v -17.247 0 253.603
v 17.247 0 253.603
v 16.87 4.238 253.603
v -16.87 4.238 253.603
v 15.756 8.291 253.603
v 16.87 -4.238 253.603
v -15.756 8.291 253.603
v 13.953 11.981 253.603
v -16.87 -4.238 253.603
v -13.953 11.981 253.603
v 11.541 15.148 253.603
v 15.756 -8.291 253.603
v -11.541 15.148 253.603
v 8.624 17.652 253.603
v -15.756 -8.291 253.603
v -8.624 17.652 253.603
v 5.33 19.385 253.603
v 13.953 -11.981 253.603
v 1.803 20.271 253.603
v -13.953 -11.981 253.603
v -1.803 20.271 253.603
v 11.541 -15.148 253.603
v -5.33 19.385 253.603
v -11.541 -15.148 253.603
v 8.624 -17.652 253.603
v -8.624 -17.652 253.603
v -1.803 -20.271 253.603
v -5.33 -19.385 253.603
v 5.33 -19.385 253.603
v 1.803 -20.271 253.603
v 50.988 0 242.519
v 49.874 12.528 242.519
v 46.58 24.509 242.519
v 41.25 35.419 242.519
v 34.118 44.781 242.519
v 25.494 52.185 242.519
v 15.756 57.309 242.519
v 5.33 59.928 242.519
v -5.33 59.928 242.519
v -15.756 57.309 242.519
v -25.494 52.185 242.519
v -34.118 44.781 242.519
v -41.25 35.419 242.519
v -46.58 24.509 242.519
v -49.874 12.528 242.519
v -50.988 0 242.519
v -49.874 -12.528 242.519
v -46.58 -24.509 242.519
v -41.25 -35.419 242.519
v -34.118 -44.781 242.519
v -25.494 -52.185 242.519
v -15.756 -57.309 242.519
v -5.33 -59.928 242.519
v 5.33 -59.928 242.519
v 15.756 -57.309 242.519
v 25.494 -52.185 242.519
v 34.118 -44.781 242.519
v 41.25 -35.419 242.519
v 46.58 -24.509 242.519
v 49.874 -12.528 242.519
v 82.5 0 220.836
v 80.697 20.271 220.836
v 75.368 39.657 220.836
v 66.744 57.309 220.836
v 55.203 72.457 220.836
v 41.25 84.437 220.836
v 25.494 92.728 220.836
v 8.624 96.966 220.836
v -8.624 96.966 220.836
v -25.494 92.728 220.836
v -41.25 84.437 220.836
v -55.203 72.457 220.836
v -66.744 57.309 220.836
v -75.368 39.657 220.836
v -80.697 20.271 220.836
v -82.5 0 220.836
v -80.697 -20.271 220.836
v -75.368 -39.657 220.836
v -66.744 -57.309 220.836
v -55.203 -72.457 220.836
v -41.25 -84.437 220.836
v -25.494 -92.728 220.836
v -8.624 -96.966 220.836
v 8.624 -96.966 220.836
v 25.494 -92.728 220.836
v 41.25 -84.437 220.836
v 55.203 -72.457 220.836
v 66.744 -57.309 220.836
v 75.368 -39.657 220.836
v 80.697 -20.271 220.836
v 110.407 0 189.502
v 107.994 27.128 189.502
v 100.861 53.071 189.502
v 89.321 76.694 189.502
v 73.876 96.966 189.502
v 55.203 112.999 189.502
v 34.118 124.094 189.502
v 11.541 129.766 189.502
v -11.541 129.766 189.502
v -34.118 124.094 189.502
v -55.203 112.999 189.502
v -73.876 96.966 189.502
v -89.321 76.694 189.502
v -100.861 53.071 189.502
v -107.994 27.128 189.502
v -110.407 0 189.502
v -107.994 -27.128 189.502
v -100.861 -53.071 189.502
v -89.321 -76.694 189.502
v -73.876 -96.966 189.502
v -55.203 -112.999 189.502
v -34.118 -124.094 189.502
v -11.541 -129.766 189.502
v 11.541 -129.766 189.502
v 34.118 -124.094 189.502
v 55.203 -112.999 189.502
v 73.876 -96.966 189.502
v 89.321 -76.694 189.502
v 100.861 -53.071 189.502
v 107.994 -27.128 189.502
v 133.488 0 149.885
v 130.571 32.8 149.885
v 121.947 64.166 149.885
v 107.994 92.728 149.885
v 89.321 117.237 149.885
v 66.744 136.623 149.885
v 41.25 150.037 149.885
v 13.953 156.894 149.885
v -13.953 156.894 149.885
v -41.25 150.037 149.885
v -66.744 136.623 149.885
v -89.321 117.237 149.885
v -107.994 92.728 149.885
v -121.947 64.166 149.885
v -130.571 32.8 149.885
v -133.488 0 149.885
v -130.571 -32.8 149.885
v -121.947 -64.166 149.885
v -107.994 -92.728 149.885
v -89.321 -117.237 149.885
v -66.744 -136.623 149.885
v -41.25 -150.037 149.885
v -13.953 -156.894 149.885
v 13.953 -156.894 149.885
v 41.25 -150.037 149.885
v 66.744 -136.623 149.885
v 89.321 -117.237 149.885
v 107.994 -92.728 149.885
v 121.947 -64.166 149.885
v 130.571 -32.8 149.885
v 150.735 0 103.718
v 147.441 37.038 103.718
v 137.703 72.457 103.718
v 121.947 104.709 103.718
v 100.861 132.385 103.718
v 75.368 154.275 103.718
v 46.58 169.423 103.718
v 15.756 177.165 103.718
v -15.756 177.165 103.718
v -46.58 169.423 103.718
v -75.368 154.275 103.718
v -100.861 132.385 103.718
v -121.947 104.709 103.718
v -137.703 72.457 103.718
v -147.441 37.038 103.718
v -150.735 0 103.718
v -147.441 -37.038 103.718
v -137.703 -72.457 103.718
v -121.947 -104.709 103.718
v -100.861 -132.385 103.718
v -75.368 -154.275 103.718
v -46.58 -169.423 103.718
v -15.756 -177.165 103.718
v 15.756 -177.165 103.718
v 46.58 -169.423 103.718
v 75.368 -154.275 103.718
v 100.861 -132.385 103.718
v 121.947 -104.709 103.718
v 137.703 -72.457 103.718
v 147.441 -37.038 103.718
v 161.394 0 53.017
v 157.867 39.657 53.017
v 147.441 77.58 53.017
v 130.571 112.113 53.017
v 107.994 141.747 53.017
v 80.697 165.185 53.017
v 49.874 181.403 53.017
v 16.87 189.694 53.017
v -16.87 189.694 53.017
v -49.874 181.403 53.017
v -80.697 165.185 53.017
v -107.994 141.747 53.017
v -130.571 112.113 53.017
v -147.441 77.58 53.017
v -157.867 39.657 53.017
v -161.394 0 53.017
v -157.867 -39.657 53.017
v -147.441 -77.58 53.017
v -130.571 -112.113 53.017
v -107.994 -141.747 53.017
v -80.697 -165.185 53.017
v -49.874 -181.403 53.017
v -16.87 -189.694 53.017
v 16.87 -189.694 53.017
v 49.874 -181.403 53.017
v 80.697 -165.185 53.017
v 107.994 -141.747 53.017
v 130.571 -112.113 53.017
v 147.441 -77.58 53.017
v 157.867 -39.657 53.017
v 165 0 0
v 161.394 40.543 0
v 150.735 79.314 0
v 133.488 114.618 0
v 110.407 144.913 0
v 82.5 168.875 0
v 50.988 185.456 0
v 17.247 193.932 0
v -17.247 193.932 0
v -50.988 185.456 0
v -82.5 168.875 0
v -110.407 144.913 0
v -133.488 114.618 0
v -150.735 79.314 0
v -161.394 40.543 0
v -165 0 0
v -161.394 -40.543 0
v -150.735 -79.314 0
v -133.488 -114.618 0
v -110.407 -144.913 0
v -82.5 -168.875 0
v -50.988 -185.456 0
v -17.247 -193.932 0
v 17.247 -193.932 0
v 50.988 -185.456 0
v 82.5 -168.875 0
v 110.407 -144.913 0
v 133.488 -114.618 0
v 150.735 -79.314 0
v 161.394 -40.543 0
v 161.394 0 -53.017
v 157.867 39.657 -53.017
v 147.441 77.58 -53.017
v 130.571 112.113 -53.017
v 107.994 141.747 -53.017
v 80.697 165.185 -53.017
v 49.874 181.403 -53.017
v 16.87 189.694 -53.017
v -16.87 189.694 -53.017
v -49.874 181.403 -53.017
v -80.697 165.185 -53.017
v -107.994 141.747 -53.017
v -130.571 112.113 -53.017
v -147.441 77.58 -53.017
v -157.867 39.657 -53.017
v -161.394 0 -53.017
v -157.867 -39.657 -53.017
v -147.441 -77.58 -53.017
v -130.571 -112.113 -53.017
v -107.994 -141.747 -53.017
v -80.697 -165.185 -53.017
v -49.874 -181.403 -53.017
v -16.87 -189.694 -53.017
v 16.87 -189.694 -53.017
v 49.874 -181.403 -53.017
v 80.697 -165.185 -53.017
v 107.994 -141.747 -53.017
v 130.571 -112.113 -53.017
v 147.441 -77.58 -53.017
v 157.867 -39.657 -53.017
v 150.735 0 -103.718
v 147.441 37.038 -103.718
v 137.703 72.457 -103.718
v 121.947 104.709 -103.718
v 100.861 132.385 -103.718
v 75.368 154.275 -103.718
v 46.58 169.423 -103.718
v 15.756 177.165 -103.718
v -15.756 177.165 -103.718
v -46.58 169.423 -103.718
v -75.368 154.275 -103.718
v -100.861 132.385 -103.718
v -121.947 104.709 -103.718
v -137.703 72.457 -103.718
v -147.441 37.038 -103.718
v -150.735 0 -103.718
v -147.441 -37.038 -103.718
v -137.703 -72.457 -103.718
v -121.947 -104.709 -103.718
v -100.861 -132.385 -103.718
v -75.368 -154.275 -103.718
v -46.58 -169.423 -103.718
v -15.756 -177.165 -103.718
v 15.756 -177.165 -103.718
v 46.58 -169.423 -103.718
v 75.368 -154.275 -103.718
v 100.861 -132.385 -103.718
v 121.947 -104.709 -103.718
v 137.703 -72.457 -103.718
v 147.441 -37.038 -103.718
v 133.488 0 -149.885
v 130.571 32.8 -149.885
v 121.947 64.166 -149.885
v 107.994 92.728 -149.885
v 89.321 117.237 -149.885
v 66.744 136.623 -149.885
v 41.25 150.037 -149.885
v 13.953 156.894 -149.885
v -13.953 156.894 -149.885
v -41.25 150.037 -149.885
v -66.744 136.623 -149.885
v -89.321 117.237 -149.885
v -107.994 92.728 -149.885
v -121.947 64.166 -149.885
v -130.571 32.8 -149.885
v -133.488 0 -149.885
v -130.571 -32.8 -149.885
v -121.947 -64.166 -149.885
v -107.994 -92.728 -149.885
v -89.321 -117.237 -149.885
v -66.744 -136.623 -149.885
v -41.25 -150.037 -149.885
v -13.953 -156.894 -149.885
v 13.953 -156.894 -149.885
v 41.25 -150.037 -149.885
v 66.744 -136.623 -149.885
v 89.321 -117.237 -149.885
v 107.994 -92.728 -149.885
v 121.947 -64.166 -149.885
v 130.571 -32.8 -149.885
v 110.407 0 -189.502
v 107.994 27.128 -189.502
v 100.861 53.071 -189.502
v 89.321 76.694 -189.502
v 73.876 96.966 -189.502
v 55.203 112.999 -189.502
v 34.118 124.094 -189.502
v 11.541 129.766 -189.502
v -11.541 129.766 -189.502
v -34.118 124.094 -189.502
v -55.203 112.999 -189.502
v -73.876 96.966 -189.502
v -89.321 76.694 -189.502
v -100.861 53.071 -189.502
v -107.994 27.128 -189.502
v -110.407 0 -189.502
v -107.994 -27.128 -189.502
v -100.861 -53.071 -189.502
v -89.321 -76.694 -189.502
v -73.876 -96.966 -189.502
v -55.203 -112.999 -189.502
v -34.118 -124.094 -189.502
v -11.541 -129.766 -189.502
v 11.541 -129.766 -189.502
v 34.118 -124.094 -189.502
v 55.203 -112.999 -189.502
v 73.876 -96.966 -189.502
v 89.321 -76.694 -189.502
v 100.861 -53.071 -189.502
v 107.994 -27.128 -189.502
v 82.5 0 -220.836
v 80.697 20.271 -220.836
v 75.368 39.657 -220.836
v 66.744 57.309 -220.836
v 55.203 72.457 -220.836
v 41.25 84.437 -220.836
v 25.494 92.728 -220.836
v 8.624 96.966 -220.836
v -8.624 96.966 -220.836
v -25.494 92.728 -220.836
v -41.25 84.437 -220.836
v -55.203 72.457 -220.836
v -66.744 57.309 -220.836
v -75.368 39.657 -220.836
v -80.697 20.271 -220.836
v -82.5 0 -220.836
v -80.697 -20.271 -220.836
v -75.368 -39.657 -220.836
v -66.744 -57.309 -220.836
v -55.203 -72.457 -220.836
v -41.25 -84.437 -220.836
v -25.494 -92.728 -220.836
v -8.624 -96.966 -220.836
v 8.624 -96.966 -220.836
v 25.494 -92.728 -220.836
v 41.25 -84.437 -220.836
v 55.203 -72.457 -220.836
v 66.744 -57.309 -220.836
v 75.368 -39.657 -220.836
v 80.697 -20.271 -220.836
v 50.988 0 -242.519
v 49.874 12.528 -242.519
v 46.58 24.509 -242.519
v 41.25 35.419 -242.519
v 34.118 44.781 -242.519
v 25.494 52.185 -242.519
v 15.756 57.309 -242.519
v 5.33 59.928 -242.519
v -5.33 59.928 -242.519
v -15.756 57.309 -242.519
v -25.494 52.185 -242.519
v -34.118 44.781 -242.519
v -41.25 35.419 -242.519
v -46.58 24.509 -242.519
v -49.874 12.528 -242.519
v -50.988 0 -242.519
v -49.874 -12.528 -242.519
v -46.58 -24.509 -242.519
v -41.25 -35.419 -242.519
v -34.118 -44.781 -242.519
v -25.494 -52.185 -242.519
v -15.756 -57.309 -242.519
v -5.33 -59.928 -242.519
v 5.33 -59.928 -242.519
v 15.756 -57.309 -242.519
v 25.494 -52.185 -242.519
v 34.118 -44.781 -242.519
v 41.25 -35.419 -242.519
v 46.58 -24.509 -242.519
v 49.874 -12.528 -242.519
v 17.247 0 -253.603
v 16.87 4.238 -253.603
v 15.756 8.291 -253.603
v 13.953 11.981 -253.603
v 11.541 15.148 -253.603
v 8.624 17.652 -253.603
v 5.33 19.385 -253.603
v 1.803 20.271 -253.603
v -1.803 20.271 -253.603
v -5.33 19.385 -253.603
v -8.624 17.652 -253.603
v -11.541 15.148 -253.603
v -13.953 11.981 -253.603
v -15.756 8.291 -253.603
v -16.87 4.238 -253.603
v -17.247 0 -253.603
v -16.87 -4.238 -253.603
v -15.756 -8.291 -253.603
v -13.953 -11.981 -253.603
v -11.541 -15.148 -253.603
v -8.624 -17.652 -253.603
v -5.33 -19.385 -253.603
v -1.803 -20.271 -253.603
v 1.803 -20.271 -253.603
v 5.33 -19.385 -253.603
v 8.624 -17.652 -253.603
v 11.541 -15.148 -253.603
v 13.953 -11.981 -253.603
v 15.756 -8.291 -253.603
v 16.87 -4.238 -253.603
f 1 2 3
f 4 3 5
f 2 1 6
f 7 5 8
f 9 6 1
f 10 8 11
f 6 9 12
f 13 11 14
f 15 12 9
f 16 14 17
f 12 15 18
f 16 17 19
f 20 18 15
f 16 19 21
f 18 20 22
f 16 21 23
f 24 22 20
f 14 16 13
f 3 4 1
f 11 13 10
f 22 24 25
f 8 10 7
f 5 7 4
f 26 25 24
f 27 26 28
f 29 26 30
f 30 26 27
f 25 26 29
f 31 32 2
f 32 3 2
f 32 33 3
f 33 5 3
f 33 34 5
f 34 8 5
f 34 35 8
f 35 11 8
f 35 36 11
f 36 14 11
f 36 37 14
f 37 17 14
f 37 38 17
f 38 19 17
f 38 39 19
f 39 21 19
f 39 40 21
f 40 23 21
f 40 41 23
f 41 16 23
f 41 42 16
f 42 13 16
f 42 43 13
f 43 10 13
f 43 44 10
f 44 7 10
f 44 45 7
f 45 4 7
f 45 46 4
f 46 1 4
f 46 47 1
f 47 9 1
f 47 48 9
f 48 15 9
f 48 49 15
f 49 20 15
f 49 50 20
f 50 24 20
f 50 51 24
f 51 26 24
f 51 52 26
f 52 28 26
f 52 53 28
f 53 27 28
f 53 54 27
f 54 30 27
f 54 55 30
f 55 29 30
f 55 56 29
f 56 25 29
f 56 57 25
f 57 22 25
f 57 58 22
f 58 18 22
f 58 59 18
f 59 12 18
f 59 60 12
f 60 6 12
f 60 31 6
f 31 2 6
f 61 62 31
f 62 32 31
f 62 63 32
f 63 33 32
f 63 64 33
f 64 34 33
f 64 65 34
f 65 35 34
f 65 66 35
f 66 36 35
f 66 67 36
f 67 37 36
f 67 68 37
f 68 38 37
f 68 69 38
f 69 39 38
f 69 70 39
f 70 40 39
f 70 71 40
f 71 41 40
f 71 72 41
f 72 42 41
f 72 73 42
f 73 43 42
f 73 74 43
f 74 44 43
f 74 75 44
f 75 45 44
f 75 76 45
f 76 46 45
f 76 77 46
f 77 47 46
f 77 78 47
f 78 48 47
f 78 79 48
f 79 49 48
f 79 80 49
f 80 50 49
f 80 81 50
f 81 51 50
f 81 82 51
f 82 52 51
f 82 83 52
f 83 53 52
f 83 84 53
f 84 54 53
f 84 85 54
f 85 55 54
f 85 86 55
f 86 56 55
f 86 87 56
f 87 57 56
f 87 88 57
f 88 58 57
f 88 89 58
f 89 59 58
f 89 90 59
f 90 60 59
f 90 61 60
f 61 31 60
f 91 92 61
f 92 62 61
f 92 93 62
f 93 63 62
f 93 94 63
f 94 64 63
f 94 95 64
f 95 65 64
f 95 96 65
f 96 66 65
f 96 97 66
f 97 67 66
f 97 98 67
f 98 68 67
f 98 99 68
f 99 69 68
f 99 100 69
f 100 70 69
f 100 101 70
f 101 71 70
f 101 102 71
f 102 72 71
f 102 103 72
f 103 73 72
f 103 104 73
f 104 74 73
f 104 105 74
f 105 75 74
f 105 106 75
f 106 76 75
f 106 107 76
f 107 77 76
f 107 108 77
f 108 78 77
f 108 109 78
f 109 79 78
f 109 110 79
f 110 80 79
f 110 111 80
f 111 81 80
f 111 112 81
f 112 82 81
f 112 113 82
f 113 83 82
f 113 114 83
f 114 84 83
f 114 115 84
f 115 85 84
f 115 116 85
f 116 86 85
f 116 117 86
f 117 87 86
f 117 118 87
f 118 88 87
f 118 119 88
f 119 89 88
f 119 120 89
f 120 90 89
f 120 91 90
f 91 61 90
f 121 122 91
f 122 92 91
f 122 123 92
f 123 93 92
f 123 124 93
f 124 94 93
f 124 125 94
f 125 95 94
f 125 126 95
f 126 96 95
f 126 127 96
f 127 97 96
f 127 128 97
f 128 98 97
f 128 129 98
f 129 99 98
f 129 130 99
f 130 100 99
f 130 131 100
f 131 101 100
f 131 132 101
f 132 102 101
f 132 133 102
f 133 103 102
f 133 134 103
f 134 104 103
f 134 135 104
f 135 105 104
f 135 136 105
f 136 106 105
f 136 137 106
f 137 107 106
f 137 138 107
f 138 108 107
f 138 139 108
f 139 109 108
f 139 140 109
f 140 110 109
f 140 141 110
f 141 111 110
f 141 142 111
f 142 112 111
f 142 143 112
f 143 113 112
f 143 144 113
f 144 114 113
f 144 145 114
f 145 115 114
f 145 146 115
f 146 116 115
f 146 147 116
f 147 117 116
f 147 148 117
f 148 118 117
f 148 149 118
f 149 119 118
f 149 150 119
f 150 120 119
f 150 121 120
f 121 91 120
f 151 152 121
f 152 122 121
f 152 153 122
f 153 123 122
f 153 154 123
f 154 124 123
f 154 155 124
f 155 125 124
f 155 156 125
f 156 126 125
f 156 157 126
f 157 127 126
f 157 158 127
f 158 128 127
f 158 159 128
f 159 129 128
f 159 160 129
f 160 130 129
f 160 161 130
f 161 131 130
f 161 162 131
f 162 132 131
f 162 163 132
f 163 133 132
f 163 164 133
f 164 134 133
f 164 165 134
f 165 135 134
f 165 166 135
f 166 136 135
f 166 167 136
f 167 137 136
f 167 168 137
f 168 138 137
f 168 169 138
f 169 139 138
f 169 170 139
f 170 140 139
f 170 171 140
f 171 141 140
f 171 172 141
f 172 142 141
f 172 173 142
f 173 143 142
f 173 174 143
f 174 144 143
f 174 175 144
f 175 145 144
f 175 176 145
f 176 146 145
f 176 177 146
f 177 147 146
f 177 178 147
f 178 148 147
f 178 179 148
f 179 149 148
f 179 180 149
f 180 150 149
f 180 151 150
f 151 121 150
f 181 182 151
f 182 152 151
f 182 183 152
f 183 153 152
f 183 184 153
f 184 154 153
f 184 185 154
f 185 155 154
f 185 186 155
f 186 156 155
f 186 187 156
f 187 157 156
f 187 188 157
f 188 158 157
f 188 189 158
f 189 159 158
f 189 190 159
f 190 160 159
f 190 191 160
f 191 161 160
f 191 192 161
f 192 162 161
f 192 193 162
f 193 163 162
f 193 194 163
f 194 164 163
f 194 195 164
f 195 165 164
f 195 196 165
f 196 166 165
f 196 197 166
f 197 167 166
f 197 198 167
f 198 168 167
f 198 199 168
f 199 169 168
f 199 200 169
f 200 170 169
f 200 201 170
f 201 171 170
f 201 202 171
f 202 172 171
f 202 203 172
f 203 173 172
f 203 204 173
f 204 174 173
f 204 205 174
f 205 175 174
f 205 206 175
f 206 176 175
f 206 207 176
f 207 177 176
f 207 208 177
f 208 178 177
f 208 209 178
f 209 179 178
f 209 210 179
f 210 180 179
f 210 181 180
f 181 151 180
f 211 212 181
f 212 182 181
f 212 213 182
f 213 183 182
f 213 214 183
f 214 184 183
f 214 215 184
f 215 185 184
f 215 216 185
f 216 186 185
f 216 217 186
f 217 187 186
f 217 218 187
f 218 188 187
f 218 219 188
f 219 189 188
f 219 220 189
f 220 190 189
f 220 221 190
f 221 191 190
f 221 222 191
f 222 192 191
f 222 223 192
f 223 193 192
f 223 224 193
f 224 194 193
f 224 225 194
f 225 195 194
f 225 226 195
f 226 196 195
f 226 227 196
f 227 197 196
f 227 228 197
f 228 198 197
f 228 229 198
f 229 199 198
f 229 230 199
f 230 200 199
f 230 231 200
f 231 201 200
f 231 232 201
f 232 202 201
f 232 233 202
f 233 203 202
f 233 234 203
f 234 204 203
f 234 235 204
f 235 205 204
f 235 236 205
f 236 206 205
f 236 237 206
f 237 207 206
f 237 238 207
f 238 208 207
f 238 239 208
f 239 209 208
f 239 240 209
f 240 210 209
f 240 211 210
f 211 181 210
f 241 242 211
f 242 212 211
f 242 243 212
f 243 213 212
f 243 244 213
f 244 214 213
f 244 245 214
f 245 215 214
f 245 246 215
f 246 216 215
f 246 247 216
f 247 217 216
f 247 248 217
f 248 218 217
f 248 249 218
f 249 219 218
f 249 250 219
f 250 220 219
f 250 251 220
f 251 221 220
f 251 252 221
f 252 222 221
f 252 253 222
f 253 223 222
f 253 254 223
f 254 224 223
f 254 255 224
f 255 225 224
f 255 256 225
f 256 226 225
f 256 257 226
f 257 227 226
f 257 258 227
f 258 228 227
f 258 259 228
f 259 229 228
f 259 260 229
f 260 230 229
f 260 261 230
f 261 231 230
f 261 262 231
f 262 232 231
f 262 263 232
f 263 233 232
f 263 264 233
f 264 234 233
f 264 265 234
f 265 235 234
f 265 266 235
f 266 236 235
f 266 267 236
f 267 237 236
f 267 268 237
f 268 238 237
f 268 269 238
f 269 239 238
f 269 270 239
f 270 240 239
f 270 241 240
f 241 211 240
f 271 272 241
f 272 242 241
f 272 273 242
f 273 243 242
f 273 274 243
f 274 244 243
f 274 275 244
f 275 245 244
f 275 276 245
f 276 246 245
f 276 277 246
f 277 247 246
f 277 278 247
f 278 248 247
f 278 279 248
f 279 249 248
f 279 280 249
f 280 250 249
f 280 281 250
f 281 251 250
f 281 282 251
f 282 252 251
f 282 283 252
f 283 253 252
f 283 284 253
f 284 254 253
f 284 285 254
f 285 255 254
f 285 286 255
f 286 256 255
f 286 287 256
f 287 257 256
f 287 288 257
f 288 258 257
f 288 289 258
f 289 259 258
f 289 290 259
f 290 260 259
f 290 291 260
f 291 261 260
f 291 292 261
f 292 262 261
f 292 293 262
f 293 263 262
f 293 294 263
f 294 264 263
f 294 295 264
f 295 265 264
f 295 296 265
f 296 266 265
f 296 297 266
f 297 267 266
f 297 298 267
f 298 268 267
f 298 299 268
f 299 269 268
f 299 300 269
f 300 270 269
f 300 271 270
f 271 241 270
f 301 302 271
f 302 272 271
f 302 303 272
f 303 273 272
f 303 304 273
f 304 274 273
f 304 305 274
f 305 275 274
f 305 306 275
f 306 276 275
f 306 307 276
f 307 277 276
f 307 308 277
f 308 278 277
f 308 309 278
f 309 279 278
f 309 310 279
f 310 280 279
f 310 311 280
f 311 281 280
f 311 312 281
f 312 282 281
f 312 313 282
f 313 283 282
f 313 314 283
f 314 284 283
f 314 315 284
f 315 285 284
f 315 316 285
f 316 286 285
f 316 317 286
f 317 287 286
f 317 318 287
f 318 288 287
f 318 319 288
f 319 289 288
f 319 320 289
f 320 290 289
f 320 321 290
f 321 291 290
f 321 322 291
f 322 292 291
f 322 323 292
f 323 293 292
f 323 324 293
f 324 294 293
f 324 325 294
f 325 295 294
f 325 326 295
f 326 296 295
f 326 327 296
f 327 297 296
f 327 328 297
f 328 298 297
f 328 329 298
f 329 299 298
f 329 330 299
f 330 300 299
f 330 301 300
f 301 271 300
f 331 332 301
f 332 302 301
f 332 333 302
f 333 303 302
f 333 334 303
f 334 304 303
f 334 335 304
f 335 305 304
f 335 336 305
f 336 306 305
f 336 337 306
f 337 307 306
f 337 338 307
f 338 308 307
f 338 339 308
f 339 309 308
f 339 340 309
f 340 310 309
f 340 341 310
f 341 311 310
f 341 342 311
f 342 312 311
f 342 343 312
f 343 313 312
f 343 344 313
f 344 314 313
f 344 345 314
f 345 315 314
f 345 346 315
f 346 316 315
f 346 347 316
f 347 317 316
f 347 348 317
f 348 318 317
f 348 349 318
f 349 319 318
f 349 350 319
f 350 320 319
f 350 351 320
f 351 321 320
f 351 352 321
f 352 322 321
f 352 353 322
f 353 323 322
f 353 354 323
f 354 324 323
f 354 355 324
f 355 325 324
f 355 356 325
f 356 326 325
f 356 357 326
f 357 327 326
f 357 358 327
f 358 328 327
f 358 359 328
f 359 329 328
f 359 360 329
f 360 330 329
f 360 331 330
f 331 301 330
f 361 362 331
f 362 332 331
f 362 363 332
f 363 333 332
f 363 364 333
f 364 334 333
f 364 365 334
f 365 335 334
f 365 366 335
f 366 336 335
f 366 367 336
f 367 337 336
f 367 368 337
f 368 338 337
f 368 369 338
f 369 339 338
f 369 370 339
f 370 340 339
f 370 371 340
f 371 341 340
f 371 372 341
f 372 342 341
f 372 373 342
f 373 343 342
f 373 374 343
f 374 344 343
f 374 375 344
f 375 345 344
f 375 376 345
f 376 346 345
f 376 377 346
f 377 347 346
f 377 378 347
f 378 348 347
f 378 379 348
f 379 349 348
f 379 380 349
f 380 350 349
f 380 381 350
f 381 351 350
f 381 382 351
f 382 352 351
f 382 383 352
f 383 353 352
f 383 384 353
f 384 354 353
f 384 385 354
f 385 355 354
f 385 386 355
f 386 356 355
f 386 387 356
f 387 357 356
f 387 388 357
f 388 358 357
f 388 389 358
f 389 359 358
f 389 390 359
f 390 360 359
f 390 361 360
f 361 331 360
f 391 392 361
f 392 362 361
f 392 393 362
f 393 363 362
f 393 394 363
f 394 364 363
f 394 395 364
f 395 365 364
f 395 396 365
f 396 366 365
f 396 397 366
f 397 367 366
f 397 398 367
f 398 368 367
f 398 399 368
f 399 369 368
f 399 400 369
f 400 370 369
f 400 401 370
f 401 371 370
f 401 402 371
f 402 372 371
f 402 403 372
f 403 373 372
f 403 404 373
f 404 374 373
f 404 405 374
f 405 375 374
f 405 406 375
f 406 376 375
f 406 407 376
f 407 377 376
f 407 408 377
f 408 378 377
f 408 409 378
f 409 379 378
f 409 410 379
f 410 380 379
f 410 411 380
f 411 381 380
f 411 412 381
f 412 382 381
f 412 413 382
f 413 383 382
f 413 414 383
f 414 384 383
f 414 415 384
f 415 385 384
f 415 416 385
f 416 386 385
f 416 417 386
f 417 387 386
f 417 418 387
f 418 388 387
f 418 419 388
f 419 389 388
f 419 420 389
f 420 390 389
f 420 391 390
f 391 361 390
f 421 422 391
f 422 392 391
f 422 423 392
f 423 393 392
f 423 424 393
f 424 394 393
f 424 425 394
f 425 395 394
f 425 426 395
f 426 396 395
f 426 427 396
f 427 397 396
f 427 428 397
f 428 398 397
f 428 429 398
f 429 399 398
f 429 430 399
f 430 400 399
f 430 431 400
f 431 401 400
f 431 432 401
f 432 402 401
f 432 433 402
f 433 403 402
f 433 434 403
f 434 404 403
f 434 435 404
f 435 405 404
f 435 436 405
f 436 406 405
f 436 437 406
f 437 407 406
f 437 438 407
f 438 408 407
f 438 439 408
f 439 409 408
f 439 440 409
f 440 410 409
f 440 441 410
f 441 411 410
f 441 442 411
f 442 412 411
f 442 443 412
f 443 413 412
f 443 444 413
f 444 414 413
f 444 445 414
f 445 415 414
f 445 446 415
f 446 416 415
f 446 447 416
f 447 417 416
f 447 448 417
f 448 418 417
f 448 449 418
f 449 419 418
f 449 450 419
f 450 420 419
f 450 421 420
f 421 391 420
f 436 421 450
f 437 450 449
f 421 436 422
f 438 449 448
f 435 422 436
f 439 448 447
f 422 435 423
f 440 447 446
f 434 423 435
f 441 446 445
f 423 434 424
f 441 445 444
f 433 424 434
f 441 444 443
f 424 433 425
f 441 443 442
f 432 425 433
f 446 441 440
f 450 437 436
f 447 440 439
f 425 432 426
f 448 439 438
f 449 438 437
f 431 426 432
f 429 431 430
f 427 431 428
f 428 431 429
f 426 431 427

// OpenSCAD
// Generated by SolidPython 1.0.1 on 2020-07-29 00:46:49


scale(v = [11, 13, 17]) {
	sphere(r = 15);
}
/***********************************************
*********      SolidPython code:      **********
************************************************
 
# import packages: SolidPython
from solid import *
from solid.utils import *
from itertools import chain, combinations, permutations


class Resize:

    def __init__(self, scad_file):
        self.scad_file = scad_file
        #self.scad_file = import_scad(scad_file)
        # cone/cylinder param:
        self.r1 = 0
        self.r2 = 0
        self.h = 0
        # rectangular prism param:
        self.w = 0
        self.l = 0
        # ellipse param:
        self.r = 0

    # import OpenScad code (file name corresponds to shape)


    # classify shape + parameters
    def assign(self, param1, param2, param3):
        if self.scad_file == 'cone.scad':
            self.r1 = param1
            self.r2 = param2
            self.h = param3
        elif self.scad_file == 'cylinder.scad':
            self.r1 = param1
            self.r2 = param2
            self.h = param3
        elif self.scad_file == 'rectangularPrism.scad':
            self.h = param1
            self.l = param2
            self.w = param3
        else:
            self.r = param1
            self.h = param2

    # resize parameters
    def iterate(self):
        x = range(3, 20, 2)
        i = 1
        if self.scad_file == 'cone.scad':
            tempList = list(permutations(x, 2))
            for temp in tempList:
                param1 = temp[0]
                param2 = temp[1]
                filepath = 'produced_scad_files/' + 'cone' + str(param1) + '_' + str(param2) + '_' + '.scad'
                scad_render_to_file(cylinder(h=param1, r1=param2, r2=0), filepath)

        elif self.scad_file == 'cylinder.scad':
            tempList = list(permutations(x, 3))
            for temp in tempList:
                param1 = temp[0]
                param2 = temp[1]
                filepath = 'produced_scad_files/' + 'cylinder' + str(param1) + '_' + str(param2) + '_' + '.scad'
                scad_render_to_file(cylinder(h=param1, r1=param2, r2=param2), filepath)

        elif self.scad_file == 'rectangularPrism.scad':
            tempList = list(permutations(x, 3))
            for temp in tempList:
                param1 = temp[0]
                param2 = temp[1]
                param3 = temp[2]
                filepath = 'produced_scad_files/' + 'rectangularPrism' + str(param1) + '_' + str(param2) + '_' + str(
                    param3) + '.scad'
                scad_render_to_file(cube(size=(param1, param2, param3)), filepath)

        elif self.scad_file == 'ellipse.scad':
            tempList = list(permutations(x, 4))
            for temp in tempList:
                param1 = temp[0]
                param2 = temp[1]
                param3 = temp[2]
                param4 = temp[3]
                filepath = 'produced_scad_files/' + 'ellipse' + str(param1) + '_' + str(param2) + '_' + str(param3) + '_' + str(param4) + '.scad'
                scad_render_to_file(scale([param1, param2, param3])(sphere(r=param4)), filepath)

    def render_to_scadfile(self):
        scad_render_to_file(scad, 'example.scad') 
 
************************************************/
